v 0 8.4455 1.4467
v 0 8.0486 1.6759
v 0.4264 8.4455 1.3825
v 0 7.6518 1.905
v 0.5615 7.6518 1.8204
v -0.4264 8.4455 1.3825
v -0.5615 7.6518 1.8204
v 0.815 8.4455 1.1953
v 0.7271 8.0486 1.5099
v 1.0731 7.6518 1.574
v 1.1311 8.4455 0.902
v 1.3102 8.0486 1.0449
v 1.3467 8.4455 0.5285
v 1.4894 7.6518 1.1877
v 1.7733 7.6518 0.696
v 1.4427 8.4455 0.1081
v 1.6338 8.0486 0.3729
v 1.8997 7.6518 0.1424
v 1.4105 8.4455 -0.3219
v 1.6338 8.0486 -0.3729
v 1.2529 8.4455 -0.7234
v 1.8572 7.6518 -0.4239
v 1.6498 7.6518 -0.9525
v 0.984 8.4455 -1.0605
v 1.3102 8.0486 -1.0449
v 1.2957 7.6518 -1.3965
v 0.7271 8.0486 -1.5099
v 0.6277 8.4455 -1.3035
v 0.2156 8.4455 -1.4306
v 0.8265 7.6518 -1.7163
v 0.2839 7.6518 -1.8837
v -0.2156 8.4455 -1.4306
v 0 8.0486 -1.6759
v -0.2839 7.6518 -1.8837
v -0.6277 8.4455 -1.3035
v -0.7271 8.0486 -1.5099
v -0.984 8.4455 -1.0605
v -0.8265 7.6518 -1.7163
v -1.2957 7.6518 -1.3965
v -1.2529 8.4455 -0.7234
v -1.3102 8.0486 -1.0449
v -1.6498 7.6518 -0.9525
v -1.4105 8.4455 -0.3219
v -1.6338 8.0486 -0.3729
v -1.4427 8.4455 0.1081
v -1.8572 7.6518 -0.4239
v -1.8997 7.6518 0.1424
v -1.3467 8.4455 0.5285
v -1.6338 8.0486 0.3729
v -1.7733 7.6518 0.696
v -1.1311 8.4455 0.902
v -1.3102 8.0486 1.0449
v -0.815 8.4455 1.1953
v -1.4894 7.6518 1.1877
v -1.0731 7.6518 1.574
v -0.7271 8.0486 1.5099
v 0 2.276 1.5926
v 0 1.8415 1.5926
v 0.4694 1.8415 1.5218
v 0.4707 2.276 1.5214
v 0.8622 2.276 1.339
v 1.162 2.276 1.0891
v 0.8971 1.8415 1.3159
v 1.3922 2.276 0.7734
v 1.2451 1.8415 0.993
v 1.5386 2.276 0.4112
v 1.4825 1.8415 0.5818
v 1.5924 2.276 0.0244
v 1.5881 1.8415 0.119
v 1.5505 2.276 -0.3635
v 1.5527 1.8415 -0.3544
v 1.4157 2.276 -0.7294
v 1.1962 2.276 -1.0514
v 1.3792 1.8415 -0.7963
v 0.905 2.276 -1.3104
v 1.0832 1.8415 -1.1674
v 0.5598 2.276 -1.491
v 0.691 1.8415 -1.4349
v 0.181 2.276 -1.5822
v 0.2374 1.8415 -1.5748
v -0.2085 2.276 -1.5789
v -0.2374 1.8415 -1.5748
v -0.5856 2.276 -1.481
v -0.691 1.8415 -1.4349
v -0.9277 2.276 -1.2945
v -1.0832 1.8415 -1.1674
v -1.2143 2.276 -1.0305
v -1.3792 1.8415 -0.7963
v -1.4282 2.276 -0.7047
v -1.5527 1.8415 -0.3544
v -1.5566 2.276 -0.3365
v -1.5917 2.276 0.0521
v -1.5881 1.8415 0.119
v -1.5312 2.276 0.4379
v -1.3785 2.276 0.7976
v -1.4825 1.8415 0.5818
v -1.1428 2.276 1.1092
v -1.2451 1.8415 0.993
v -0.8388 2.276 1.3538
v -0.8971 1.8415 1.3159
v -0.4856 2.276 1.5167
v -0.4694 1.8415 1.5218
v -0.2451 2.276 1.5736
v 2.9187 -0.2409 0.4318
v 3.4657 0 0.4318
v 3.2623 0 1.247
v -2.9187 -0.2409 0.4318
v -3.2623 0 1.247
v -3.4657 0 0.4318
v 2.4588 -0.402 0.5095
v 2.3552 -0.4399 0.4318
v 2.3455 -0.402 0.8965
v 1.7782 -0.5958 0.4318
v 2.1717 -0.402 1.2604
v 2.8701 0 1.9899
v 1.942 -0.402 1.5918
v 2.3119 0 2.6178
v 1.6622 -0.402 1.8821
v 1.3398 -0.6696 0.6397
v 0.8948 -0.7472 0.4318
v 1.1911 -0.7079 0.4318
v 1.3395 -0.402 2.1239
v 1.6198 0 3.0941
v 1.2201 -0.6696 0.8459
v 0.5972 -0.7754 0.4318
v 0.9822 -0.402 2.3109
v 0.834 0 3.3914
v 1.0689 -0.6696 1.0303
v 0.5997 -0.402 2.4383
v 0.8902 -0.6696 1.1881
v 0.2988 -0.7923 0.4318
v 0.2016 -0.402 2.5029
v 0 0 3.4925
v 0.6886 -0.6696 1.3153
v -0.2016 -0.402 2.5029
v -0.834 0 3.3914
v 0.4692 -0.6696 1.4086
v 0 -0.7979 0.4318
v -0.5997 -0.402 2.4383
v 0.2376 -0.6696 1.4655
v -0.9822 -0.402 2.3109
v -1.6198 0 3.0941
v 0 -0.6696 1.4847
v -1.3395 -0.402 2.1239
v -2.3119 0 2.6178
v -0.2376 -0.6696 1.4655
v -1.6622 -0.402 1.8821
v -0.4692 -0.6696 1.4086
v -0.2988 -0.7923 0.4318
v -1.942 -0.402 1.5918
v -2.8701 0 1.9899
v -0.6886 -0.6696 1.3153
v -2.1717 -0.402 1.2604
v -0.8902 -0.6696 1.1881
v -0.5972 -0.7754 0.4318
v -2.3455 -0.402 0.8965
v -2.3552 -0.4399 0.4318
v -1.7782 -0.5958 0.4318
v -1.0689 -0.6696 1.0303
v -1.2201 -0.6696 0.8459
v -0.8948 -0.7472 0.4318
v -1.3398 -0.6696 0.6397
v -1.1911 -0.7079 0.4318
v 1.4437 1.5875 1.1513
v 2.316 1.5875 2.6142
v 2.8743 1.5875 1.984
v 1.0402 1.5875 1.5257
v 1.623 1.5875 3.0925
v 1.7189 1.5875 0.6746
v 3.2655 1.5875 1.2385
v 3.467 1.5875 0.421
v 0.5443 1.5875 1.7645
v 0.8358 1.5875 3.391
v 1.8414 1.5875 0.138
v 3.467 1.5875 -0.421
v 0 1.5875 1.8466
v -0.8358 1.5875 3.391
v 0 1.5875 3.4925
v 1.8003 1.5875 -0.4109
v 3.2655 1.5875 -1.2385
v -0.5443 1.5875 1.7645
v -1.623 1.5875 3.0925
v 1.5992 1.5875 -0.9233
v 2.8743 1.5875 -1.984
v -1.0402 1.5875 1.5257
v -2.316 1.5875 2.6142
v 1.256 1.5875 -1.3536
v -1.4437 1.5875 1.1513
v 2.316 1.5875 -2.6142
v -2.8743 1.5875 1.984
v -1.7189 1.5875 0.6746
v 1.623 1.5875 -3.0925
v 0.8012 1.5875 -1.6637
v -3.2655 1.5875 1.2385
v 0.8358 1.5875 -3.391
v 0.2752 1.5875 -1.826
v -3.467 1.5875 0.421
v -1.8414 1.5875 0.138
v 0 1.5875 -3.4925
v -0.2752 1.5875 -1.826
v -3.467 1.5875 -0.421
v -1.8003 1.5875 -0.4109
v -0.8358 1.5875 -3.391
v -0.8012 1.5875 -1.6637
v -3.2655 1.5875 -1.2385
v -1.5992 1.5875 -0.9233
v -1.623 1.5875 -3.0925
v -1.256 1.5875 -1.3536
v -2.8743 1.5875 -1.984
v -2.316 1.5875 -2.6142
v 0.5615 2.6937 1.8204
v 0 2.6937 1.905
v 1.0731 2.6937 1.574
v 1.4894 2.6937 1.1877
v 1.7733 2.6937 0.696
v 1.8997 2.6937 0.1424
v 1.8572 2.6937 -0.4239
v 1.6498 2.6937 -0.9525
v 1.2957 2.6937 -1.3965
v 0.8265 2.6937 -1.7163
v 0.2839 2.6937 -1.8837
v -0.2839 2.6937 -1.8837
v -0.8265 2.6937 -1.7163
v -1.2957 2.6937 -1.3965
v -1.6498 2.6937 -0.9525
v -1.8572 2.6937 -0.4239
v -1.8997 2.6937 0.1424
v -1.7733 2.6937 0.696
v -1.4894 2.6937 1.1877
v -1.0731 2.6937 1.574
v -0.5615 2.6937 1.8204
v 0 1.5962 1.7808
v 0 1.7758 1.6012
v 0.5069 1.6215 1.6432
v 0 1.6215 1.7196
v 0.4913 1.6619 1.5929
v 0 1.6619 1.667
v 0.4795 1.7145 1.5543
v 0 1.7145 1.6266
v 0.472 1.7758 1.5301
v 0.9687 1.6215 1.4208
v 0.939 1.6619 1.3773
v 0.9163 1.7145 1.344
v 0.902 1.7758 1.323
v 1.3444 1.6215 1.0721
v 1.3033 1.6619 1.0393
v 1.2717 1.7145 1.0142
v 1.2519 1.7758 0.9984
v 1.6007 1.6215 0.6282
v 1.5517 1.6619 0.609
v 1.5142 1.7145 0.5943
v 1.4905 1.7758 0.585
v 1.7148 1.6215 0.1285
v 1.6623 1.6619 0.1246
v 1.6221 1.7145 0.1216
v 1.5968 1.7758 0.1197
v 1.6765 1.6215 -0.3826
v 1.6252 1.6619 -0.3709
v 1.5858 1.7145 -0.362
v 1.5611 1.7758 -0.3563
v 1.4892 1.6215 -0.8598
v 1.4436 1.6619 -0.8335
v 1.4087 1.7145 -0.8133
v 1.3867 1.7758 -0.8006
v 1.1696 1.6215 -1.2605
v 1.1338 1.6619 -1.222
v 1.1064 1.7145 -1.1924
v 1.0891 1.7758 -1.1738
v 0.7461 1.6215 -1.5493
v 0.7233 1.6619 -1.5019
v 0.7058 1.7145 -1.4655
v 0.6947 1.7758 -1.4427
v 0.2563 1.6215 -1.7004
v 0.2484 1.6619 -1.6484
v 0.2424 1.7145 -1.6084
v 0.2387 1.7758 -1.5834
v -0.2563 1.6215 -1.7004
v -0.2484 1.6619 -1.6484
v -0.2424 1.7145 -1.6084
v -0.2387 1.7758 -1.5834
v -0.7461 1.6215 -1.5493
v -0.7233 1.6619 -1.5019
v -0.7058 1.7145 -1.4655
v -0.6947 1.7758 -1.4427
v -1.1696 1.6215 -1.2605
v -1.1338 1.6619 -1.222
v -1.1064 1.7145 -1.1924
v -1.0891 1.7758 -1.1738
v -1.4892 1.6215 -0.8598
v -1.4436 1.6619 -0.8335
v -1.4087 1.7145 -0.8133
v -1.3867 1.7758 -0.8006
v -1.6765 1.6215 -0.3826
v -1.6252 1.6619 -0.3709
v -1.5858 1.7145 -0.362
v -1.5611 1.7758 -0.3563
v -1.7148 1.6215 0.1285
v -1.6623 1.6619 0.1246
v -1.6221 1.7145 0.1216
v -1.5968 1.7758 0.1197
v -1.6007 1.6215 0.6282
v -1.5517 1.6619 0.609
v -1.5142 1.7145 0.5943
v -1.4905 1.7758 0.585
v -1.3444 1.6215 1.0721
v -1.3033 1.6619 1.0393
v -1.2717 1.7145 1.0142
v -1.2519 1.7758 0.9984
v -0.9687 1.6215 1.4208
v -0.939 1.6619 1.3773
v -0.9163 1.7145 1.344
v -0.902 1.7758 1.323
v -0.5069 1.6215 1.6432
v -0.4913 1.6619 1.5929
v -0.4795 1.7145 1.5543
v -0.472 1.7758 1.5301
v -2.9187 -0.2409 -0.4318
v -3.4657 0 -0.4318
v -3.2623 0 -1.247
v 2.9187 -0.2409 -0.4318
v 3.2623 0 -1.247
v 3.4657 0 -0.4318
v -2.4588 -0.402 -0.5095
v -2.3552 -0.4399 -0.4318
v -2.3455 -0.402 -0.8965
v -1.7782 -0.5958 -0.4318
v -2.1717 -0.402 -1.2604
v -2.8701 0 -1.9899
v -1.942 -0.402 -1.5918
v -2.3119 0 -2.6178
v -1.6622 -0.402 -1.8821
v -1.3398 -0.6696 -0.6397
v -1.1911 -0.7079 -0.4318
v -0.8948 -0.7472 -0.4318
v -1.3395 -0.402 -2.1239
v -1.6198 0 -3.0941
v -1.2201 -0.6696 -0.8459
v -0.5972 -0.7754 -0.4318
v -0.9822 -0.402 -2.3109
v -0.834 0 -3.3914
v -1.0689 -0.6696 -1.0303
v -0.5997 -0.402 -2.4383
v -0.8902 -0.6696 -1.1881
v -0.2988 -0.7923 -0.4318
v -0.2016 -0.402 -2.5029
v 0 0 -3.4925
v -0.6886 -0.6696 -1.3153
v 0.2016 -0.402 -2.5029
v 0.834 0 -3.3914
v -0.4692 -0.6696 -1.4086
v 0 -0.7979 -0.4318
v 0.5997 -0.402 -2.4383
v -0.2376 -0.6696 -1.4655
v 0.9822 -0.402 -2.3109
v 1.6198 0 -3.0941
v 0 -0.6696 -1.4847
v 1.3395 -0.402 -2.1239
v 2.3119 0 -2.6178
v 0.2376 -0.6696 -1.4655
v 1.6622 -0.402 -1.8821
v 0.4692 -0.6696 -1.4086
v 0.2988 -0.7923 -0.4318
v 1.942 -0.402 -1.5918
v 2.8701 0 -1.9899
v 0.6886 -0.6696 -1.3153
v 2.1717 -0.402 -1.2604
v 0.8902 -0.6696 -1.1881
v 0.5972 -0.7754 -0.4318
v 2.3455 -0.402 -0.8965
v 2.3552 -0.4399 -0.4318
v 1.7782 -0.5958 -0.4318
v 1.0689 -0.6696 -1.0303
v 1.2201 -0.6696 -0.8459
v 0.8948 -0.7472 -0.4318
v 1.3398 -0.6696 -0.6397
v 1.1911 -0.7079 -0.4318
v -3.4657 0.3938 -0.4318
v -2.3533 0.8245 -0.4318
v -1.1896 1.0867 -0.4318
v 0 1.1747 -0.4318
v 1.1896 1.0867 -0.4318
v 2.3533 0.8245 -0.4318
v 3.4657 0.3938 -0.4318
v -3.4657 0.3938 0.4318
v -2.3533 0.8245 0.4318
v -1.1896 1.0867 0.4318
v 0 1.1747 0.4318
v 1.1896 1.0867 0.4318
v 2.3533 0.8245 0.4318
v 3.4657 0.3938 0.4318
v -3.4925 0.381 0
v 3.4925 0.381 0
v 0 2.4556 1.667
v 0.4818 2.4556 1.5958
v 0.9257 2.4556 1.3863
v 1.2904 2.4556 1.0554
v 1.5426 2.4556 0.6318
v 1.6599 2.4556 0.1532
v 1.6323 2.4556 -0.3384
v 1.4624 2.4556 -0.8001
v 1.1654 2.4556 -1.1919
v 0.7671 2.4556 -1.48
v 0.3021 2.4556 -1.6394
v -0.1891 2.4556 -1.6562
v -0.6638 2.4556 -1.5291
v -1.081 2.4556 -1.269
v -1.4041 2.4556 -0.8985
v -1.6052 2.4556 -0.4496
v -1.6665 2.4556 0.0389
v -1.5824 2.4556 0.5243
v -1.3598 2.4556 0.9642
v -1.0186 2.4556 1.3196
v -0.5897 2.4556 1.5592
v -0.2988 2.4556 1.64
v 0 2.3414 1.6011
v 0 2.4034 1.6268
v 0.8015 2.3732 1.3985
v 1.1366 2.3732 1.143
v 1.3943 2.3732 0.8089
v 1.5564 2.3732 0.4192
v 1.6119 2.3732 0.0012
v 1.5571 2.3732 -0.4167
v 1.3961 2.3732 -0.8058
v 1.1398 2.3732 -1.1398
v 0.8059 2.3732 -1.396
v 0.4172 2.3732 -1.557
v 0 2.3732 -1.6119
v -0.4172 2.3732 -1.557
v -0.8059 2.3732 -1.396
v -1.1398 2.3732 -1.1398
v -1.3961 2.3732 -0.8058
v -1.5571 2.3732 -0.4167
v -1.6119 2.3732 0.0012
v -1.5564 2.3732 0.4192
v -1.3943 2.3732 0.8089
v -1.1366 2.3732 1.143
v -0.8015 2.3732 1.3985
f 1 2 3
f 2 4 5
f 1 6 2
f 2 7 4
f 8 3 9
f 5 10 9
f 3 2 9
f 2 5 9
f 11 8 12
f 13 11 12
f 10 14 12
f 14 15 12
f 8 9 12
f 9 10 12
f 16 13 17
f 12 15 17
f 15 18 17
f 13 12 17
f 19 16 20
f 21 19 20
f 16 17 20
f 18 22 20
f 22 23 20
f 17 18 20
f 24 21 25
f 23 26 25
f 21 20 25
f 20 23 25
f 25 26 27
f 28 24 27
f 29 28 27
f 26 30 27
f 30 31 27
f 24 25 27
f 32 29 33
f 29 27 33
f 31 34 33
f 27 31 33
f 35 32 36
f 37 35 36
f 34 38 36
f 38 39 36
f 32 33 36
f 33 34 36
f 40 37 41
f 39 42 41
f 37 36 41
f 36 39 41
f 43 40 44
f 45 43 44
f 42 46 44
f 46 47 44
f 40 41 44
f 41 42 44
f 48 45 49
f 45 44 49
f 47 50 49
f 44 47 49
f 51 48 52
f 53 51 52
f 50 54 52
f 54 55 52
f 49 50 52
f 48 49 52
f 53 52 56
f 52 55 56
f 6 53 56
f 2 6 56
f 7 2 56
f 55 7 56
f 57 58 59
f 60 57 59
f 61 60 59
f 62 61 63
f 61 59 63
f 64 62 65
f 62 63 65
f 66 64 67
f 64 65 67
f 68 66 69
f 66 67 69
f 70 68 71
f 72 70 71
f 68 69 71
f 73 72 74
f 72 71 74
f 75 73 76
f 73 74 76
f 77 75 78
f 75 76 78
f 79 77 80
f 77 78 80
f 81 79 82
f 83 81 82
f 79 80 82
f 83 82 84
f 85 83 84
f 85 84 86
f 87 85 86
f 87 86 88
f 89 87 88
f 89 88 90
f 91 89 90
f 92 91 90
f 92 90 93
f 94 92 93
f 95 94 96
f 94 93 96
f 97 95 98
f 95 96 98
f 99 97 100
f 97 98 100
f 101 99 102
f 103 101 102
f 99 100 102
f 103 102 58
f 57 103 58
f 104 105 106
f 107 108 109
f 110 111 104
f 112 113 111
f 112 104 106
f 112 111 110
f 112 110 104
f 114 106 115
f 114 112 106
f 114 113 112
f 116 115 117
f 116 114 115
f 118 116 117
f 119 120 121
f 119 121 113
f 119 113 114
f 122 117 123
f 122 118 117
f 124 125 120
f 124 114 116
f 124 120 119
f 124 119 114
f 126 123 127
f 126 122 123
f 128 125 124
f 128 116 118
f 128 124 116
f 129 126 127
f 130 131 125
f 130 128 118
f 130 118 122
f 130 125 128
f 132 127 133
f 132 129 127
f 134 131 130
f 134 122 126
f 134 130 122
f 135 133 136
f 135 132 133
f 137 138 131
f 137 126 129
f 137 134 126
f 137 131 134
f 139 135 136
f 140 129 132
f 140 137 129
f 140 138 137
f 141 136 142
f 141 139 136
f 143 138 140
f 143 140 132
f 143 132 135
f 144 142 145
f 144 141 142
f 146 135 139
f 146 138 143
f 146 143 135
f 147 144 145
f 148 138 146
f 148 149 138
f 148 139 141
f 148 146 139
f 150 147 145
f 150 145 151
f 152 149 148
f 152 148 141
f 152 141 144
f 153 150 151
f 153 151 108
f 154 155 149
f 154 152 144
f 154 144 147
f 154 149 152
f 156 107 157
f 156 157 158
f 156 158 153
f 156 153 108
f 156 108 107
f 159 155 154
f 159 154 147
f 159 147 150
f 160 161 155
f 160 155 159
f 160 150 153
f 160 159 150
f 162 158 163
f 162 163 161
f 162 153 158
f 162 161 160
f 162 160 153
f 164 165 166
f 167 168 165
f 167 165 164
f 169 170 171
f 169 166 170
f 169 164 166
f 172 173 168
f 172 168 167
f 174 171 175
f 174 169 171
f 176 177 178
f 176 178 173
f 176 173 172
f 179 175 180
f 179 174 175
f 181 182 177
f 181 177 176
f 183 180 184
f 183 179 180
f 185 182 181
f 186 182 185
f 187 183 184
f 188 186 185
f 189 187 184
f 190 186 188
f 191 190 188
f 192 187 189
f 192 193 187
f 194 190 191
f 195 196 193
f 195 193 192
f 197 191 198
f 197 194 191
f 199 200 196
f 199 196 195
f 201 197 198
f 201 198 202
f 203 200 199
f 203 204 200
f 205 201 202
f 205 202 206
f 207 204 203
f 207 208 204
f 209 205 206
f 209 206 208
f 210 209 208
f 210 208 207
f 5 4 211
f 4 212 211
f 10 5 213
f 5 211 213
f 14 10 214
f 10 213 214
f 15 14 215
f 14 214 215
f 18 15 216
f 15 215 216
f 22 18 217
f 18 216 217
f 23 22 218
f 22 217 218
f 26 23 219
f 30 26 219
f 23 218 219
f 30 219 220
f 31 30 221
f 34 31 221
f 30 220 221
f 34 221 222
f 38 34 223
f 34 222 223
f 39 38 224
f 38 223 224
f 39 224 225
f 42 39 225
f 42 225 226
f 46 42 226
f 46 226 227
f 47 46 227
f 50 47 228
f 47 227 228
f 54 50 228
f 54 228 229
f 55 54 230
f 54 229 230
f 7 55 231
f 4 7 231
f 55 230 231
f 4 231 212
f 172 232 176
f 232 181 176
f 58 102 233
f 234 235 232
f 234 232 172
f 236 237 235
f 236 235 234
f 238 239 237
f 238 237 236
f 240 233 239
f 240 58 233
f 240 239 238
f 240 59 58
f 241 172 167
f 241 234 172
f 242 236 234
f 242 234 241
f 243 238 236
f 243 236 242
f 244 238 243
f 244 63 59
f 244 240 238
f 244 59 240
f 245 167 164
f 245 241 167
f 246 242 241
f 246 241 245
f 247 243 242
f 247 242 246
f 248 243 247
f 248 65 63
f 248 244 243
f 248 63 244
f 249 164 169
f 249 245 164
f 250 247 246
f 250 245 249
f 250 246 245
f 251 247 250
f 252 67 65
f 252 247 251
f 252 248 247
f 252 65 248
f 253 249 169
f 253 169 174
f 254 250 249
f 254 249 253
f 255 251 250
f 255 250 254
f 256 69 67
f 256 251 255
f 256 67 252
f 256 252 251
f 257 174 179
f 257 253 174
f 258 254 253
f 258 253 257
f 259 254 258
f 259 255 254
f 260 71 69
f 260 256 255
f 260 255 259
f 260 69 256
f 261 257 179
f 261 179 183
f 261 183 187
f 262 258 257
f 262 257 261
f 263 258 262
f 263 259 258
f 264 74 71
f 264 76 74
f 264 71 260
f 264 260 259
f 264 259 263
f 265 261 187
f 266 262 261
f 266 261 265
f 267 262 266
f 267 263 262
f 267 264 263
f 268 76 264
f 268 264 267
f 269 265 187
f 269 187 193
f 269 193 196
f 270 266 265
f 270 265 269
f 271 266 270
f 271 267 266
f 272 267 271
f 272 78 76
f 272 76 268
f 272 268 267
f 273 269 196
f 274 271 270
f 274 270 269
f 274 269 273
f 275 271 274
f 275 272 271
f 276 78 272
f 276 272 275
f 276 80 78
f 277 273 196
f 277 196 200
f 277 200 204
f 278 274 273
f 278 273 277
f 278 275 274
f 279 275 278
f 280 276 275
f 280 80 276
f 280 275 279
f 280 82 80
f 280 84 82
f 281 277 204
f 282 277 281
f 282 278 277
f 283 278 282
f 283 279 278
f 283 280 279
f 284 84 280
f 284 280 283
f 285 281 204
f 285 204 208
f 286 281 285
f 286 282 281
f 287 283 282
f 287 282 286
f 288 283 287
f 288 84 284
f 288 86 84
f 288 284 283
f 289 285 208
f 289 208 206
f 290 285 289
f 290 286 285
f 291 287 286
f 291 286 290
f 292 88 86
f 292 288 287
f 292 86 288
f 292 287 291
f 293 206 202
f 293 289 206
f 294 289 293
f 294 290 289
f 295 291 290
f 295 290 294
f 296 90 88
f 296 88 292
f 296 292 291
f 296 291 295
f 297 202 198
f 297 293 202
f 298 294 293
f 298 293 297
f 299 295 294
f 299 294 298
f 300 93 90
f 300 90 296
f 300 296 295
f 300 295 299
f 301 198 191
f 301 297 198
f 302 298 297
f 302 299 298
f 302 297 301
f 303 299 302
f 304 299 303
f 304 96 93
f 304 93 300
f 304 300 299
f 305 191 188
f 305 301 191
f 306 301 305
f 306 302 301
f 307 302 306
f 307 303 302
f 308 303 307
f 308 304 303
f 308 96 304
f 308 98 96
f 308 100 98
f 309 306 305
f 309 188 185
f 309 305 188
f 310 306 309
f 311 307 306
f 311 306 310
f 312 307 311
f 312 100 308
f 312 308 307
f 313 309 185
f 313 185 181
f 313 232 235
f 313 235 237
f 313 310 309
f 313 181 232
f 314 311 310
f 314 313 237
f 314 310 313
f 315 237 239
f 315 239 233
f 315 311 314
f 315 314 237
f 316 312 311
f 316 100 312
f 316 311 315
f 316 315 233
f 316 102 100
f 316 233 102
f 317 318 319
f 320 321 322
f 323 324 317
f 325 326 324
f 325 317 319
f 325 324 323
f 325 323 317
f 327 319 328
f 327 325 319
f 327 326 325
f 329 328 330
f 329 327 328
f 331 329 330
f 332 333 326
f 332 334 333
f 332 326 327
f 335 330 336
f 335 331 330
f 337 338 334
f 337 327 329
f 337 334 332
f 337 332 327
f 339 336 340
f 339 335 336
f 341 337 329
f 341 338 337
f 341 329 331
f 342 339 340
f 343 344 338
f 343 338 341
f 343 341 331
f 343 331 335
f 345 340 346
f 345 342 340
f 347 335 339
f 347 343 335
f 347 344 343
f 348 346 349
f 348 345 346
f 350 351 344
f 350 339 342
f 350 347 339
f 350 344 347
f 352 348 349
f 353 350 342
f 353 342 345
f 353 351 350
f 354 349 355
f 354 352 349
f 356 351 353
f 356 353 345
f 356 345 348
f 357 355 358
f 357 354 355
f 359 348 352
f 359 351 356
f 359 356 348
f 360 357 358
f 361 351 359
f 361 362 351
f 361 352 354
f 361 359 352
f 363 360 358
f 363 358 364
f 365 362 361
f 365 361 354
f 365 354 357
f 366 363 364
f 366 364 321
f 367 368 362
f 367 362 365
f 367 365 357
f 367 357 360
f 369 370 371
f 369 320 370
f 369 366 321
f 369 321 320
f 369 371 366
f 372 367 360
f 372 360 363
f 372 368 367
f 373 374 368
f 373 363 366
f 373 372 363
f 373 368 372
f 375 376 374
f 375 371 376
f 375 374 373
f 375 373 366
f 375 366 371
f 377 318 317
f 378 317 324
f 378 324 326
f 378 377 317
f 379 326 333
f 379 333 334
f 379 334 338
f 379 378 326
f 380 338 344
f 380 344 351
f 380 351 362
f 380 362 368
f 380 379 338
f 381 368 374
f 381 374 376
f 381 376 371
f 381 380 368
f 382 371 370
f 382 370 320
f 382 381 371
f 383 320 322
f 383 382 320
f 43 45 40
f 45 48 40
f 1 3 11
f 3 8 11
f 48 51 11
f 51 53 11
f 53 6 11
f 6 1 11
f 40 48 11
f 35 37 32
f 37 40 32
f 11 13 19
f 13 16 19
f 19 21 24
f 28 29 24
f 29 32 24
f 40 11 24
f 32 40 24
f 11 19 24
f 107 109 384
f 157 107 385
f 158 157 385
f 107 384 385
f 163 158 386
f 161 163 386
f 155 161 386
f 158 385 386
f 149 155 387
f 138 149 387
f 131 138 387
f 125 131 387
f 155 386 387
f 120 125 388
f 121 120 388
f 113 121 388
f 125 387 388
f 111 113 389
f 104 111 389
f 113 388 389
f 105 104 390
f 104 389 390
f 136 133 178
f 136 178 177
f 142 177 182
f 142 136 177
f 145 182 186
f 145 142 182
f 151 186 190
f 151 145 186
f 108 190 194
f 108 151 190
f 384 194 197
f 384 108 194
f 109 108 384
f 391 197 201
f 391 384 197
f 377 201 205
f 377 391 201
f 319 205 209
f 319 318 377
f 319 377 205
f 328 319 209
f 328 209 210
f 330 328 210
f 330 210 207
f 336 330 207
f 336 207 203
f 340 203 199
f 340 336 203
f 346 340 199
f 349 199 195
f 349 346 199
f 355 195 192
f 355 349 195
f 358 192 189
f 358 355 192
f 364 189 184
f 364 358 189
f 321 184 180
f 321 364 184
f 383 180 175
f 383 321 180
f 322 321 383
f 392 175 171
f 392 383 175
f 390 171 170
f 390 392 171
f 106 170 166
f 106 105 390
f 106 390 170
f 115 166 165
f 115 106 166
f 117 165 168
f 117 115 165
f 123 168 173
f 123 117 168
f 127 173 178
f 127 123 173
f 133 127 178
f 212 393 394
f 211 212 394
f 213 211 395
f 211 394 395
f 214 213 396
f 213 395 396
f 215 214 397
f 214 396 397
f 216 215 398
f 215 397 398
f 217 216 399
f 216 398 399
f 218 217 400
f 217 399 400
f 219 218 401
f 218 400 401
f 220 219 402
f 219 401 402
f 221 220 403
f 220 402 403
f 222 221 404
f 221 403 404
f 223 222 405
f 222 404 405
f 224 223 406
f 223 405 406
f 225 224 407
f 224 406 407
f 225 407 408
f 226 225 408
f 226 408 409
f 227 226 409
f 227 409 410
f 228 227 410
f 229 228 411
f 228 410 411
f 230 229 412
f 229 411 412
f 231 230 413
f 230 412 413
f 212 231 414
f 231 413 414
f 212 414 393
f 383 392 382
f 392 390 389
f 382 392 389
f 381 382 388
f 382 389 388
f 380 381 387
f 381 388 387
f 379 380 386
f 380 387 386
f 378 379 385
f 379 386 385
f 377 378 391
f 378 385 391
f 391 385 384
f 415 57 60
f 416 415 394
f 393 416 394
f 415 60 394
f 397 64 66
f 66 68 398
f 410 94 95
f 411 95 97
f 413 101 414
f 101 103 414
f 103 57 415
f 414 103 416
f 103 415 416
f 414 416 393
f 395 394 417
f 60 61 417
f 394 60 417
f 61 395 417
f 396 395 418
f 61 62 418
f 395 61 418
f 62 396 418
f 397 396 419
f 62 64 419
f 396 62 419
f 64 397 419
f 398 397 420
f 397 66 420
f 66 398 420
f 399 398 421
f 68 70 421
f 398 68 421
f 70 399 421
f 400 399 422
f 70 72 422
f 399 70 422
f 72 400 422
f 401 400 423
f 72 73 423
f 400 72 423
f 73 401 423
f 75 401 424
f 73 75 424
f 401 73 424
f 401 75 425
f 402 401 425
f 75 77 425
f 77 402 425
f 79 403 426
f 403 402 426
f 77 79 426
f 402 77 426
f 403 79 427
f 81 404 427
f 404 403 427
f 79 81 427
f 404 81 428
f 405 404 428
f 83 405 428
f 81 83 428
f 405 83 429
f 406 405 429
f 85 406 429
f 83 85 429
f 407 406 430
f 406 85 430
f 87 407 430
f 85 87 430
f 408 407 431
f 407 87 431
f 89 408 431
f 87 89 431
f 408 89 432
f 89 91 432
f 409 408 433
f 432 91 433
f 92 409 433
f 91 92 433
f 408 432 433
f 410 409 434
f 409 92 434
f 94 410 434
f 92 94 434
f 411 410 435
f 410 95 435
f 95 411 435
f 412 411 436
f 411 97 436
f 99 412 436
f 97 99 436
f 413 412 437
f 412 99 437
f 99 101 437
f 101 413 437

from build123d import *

# Parameters (mm, degrees)
F4_R     = 0.254
F6_DEPTH = 0.4318


with BuildPart() as f1:
    # F0 (on Right) → F1 (revolve)
    with BuildSketch(Plane.YZ):
        with BuildLine():
            Line((-0.8096426782, 0), (0, 0))
            Line((0, 0), (1.5875, 0))
            Line((1.5875, 0), (1.5875, 3.4925))
            Line((1.5875, 3.4925), (0, 3.4925))
            ThreePointArc((0, 3.4925), (-0.6045832289, 1.7925594492), (-0.8096426782, 0))
        make_face()
    revolve(axis=Axis((0, 9.1738495976, 0), (0, -1, 0)))

    # F2 (on Right) → F3 (revolve)
    with BuildSketch(Plane.YZ):
        Polygon((2.38125, 1.59258), (1.5875, 1.59258), (1.5875, 0), (8.4455, 0), (8.4455, 1.4467282238), (7.65175, 1.905), (2.69367, 1.905), align=None)
    revolve(axis=Axis((0, 8.9318295941, 0), (0, 1, 0)))

    # F4
    f4_edges = [f1.edges().sort_by_distance(p)[0] for p in [
        (0, 1.5875, -1.59258),
        (0, 2.38125, -1.59258),
    ]]
    fillet(f4_edges, radius=F4_R)

    # F5 (on Top) → F6 (cut, symmetric)
    with BuildSketch(Plane.XY):
        with BuildLine():
            Line((3.4925, -1.3970176782), (3.4925, 0.3809823218))
            ThreePointArc((3.4925, 0.3809823218), (0, 1.1747323218), (-3.4925, 0.3809823218))
            Line((-3.4925, 0.3809823218), (-3.4925, -1.3970176782))
            Line((-3.4925, -1.3970176782), (3.4925, -1.3970176782))
        make_face()
    extrude(amount=F6_DEPTH, both=True, mode=Mode.SUBTRACT)


solid = f1.part
